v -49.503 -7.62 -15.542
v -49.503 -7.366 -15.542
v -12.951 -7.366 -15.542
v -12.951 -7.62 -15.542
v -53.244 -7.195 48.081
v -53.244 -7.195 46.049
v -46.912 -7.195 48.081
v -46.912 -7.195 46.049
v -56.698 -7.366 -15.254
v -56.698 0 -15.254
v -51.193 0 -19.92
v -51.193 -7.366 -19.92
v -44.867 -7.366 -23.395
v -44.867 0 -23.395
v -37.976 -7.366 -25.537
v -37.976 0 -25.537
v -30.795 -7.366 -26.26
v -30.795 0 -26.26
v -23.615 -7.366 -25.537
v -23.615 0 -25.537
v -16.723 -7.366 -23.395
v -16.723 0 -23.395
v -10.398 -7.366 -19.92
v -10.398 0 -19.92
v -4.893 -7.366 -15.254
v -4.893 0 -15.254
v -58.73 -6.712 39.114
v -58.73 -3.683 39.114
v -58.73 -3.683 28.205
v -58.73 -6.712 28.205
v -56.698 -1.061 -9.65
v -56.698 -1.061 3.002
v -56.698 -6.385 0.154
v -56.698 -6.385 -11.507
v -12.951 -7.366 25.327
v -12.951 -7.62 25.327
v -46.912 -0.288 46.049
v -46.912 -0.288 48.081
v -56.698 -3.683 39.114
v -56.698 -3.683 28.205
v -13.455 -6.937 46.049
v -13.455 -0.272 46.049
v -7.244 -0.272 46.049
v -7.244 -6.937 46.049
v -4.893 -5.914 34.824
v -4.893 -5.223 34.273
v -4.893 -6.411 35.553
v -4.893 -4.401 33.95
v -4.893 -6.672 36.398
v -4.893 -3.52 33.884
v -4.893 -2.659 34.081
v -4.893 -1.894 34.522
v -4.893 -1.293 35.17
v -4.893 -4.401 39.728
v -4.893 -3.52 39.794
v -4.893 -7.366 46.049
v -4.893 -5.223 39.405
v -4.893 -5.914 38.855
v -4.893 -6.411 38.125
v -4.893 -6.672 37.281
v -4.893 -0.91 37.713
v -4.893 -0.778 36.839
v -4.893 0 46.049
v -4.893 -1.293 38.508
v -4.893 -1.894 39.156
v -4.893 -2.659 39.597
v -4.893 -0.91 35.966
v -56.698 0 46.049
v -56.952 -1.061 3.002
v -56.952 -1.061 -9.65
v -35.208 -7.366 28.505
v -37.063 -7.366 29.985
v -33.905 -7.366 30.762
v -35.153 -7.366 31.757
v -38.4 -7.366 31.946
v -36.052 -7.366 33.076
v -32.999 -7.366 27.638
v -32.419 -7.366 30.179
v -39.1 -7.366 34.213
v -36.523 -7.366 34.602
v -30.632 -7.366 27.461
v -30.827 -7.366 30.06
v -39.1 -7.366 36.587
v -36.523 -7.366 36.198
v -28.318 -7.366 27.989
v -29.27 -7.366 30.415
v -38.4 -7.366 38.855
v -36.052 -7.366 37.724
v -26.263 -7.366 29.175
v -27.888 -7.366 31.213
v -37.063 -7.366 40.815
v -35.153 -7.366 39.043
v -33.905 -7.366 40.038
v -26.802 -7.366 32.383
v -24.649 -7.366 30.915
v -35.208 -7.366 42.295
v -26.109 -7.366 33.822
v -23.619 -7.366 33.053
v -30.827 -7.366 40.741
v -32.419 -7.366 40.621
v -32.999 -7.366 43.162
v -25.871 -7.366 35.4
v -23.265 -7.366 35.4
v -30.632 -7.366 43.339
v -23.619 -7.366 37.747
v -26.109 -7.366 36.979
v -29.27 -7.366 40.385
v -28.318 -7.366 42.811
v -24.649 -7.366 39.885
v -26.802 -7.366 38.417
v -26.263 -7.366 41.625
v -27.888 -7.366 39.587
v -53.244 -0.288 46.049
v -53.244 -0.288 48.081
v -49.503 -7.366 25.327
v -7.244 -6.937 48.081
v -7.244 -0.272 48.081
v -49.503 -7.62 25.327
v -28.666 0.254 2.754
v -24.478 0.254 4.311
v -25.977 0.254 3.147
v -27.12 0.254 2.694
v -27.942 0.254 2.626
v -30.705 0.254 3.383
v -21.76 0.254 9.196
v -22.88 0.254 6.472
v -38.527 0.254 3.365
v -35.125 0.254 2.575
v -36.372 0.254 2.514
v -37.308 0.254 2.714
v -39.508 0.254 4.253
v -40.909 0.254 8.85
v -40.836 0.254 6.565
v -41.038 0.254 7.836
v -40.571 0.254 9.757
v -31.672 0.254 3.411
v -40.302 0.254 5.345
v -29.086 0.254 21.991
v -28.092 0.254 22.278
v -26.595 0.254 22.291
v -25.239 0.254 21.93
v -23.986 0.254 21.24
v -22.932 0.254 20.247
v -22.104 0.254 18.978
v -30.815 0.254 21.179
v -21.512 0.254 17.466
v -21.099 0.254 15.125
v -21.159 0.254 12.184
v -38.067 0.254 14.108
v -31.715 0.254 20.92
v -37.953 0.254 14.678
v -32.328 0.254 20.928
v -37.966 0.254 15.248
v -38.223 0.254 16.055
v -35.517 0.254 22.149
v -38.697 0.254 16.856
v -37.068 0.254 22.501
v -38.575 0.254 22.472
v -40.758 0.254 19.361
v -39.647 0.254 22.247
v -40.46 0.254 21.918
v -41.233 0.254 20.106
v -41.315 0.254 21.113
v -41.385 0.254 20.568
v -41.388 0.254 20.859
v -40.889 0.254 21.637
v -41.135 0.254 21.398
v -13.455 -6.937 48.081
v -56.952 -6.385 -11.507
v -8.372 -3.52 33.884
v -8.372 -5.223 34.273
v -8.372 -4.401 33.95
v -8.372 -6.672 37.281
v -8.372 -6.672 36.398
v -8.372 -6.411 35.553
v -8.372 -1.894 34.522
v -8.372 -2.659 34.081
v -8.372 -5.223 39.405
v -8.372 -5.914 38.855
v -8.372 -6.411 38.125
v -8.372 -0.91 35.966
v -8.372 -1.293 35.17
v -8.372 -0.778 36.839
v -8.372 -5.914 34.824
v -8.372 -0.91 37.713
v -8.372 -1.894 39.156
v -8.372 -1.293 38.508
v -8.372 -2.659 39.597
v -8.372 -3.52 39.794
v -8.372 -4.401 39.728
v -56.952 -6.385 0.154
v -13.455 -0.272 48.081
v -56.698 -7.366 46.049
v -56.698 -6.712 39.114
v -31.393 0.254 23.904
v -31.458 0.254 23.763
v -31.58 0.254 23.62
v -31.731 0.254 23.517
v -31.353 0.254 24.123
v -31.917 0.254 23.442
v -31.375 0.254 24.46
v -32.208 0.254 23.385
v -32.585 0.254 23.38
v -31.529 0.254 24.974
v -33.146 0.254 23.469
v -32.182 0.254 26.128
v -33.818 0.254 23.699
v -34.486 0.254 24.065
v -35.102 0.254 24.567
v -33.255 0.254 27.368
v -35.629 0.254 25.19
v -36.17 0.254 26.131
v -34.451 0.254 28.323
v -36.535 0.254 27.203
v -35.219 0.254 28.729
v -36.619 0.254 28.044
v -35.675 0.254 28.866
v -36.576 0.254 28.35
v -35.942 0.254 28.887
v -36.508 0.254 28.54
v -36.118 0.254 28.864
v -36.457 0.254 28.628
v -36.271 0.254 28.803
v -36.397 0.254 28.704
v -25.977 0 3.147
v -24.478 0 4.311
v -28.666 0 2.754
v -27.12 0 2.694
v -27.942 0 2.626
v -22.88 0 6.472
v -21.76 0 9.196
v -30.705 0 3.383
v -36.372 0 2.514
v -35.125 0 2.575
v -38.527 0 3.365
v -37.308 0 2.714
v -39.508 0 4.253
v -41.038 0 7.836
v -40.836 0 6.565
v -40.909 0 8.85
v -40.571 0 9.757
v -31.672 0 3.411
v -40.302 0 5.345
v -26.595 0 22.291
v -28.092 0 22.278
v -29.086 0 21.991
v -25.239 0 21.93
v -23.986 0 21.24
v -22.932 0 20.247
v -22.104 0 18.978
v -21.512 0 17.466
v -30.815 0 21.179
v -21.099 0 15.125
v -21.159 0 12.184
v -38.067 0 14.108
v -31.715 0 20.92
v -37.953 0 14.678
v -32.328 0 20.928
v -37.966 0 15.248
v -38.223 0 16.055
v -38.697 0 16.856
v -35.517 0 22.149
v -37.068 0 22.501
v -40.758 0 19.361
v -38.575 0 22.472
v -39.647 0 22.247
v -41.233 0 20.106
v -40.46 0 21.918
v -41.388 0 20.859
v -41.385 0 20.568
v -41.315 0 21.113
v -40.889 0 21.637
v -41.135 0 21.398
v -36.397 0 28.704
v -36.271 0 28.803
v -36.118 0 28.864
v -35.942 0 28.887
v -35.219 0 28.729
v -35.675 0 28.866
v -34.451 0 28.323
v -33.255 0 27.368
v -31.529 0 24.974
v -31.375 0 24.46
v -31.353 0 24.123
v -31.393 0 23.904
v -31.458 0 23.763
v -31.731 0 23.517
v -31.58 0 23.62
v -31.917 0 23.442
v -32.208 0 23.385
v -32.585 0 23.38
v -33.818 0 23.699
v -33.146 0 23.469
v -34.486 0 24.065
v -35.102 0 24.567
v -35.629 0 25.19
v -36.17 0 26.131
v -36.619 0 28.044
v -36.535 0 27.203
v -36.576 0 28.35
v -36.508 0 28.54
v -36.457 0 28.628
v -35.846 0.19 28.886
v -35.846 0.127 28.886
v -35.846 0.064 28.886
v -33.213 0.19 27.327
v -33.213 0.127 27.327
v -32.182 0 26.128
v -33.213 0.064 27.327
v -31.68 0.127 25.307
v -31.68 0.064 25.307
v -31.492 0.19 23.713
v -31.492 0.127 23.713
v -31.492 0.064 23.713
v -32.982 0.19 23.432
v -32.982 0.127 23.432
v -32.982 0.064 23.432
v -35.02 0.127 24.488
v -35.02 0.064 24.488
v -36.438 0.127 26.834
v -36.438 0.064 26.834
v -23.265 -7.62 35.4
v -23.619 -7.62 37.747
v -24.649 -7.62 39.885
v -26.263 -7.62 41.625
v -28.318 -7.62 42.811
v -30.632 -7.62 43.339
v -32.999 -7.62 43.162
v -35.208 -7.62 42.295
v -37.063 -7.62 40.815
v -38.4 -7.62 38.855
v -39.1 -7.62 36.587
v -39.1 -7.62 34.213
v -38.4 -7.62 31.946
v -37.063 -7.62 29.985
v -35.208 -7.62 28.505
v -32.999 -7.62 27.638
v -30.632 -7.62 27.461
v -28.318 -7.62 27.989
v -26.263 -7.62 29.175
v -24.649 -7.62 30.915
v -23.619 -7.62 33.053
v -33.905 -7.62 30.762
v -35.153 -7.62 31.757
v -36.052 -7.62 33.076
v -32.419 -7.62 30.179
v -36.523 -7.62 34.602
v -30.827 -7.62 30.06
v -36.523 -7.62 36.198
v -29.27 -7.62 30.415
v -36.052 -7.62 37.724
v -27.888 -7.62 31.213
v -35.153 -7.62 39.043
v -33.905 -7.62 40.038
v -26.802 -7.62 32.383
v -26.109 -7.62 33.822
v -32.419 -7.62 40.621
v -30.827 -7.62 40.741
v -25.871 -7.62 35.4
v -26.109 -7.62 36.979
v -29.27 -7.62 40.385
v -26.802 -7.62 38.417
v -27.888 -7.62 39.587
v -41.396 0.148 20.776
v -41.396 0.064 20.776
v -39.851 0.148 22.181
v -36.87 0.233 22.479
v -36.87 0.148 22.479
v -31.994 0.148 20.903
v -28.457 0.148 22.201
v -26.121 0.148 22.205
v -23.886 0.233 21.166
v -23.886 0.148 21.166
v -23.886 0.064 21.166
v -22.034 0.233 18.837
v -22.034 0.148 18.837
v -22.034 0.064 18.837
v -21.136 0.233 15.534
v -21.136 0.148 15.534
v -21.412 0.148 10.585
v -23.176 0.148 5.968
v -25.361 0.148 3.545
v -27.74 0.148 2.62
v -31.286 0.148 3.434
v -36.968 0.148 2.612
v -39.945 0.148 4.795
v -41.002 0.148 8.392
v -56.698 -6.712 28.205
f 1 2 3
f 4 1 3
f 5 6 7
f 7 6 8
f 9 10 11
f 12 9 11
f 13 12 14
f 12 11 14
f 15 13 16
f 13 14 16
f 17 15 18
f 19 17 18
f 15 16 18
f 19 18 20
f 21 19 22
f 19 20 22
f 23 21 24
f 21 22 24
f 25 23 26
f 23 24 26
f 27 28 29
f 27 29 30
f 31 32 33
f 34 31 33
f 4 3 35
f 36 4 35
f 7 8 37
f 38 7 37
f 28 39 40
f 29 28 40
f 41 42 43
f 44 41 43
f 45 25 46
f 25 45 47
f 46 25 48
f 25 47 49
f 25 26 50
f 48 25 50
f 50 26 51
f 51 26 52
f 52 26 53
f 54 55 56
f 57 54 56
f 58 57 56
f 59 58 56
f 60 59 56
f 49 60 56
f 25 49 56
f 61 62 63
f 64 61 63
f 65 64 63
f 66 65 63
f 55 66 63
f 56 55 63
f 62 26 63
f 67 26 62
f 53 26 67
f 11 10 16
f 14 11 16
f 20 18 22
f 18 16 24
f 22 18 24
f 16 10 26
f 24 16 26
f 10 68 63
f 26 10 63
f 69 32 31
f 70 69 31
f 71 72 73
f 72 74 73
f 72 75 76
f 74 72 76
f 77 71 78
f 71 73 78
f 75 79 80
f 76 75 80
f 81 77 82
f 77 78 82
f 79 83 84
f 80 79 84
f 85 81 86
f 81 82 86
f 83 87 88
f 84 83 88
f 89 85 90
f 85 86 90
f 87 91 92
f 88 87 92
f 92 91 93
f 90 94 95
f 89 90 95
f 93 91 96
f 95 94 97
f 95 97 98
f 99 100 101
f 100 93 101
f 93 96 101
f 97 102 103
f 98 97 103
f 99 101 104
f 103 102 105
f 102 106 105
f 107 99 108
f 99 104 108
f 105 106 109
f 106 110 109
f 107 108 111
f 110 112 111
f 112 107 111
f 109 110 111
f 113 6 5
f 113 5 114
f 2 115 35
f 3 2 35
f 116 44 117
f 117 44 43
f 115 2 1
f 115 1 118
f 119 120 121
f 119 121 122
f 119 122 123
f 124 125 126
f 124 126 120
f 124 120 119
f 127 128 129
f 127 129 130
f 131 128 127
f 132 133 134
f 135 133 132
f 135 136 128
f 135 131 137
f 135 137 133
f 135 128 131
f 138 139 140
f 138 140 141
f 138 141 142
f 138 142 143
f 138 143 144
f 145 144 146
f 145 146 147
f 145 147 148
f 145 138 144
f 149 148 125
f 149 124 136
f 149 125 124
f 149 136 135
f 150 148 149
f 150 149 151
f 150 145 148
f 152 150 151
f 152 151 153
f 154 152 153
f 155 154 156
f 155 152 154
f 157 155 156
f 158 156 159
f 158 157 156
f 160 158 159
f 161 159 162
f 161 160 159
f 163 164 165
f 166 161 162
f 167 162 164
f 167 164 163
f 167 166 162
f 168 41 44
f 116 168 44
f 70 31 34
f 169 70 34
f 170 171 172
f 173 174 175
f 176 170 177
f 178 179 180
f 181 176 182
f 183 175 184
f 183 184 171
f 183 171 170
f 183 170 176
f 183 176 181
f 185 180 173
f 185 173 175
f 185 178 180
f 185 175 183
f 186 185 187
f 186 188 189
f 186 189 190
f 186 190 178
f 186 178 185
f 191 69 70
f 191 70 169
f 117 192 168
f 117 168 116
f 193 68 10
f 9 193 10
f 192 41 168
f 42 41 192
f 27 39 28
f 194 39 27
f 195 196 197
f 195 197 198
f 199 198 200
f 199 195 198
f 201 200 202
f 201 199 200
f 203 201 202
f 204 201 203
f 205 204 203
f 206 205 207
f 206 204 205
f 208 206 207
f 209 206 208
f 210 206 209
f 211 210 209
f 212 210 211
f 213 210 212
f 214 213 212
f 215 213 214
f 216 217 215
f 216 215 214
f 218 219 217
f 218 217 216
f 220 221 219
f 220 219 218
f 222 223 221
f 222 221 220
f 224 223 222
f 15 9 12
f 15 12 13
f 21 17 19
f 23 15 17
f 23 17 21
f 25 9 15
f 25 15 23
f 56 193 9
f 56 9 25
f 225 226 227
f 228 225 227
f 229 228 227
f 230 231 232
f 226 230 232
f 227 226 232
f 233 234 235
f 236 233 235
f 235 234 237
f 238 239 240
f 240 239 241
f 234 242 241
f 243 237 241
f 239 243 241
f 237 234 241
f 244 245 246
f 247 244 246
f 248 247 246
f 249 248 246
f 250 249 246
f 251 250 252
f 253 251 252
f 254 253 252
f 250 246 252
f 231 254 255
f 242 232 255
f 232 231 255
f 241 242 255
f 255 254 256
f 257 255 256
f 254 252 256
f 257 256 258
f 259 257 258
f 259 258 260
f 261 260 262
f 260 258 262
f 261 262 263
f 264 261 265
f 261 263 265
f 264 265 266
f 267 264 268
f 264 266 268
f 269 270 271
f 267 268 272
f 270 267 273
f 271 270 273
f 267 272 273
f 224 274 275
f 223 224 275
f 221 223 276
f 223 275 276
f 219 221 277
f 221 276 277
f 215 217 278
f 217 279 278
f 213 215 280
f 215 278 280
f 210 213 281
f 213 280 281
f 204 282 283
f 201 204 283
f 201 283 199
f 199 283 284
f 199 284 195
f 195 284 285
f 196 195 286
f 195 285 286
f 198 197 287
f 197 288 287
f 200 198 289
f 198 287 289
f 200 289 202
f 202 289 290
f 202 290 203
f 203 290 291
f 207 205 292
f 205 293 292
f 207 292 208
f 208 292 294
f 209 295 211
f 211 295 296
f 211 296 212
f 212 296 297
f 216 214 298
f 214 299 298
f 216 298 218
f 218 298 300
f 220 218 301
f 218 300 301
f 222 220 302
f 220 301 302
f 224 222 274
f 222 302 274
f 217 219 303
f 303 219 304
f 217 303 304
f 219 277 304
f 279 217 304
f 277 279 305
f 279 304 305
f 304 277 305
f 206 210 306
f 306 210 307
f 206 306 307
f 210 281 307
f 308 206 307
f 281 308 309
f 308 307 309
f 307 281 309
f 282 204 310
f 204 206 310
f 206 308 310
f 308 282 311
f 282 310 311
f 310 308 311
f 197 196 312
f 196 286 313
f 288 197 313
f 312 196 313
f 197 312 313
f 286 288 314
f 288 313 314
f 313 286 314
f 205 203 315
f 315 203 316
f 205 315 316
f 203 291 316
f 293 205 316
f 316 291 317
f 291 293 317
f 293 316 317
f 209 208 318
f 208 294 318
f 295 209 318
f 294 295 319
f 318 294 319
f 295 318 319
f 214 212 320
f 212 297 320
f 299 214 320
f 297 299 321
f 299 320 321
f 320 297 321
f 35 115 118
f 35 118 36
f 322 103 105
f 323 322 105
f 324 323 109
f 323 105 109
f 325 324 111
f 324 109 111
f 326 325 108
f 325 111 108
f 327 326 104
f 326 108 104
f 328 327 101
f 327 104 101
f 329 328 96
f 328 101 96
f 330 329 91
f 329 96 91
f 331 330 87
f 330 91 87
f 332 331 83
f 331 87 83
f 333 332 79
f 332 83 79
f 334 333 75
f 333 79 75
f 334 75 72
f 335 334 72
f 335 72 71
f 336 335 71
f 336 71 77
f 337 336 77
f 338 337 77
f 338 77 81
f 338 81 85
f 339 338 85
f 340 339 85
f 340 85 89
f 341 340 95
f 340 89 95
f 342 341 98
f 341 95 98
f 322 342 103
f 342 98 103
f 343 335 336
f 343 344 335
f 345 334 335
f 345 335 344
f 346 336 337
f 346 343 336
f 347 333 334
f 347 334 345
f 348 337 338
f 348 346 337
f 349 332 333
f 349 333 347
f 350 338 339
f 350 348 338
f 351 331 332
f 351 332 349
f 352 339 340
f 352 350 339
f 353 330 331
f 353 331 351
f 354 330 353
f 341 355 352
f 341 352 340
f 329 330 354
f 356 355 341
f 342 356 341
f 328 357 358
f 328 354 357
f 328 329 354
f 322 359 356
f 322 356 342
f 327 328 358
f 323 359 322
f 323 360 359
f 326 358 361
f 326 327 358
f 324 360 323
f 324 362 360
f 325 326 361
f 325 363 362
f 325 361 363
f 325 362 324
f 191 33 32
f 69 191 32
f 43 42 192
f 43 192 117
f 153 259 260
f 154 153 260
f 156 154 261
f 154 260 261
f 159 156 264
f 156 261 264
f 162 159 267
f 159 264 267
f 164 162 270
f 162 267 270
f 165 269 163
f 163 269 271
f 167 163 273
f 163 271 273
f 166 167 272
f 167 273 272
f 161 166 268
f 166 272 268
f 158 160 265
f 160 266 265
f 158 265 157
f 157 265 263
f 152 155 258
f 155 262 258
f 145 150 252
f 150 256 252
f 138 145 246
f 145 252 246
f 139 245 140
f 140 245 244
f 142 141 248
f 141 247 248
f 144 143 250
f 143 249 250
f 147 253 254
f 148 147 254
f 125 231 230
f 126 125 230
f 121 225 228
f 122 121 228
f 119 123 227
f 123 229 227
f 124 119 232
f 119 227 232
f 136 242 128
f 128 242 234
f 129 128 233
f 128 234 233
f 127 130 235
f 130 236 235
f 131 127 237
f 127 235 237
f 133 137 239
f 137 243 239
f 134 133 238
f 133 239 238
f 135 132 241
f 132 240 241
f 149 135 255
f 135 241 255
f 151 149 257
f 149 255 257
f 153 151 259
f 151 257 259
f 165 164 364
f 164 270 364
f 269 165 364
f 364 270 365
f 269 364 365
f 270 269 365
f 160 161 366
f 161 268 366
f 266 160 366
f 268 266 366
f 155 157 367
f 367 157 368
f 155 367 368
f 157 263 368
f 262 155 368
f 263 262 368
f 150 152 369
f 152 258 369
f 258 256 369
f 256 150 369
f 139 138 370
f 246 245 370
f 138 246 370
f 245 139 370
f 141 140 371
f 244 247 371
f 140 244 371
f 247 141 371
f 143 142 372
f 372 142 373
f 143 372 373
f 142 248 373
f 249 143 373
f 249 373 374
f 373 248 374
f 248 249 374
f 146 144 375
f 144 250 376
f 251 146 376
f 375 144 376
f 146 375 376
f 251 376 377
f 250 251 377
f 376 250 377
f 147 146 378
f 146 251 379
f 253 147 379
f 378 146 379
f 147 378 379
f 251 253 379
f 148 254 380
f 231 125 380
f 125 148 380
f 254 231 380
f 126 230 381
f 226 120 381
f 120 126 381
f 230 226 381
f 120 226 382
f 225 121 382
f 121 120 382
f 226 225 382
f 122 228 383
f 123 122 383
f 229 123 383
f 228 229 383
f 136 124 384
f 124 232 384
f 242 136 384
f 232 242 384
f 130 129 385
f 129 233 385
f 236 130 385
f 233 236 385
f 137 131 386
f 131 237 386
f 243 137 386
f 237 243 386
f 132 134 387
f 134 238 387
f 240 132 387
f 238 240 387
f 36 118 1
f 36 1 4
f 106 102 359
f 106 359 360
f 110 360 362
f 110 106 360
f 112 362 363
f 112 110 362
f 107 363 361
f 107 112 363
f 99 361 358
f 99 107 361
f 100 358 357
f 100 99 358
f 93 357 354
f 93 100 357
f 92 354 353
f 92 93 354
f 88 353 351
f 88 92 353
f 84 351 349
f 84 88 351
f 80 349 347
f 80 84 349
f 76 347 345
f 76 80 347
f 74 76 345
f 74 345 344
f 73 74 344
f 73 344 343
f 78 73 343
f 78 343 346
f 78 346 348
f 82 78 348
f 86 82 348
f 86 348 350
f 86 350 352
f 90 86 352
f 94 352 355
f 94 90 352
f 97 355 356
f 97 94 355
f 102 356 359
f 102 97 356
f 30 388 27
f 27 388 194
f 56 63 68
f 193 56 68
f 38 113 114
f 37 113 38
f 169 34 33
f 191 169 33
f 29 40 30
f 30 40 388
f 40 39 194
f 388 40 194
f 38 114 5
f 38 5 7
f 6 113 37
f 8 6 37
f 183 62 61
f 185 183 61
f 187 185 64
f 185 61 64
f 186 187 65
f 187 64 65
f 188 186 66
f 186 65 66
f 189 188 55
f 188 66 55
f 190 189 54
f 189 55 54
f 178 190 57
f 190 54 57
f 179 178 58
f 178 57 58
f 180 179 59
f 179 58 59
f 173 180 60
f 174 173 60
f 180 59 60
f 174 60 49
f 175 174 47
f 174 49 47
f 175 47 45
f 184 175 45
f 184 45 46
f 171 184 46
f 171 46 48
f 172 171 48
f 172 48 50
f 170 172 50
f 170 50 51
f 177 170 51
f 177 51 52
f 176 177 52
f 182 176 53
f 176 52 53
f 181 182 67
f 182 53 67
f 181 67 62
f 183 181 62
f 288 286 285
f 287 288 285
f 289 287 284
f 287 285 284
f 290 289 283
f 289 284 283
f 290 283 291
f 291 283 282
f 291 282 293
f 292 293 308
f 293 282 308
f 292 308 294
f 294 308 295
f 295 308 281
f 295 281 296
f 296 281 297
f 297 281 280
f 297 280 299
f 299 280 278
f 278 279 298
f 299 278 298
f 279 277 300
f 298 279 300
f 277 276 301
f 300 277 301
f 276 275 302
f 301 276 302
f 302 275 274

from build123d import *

# Parameters (mm, degrees)
F1_DEPTH  = 7.366
F2_W      = 36.5513302386
F2_H      = 40.8684201539
F3_DEPTH  = 0.254
F2_R      = 7.9616167592
F2_R_2    = 5.3554300859
F4_W      = 3.0288121673
F4_H      = 5.454486236
F5_DEPTH  = 2.032
F7_DEPTH  = 0.254
F8_W      = 6.3317231834
F8_H      = 6.9073382765
F9_DEPTH  = 2.032
F8_W_2    = 6.2107169069
F8_H_2    = 6.6653245594
F10_R     = 2.9631404217
F11_DEPTH = 3.4798
F13_DEPTH = 0.254


with BuildPart() as f1:
    # F0 (on Front) → F1 (new body)
    with BuildSketch(Plane.XZ):
        with BuildLine():
            Line((-4.8926975578, 46.0489243269), (-56.6977337003, 46.0489243269))
            Line((-56.6977337003, 46.0489243269), (-56.6977337003, -15.2537049726))
            ThreePointArc((-56.6977337003, -15.2537049726), (-30.795215629, -26.260280288), (-4.8926975578, -15.2537049726))
            Line((-4.8926975578, -15.2537049726), (-4.8926975578, 46.0489243269))
        make_face()
    extrude(amount=F1_DEPTH)

    # F10 (on face) → F11 (cut)
    with BuildSketch(Plane.YZ.offset(-4.8926975578)):
        with Locations((-3.741475055, 36.8391387165)):
            Circle(F10_R)
    extrude(amount=-F11_DEPTH, mode=Mode.SUBTRACT)


with BuildPart() as f3:
    # F2 (on face) → F3 (new body)
    with BuildSketch(Plane.XZ.offset(7.366)):
        with Locations((-31.2269236892, 4.8926975578)):
            Rectangle(F2_W, F2_H)
    extrude(amount=F3_DEPTH)


with BuildPart() as f3b:
    # F2 (on face) → F3, piece 2 (new body)
    with BuildSketch(Plane.XZ.offset(7.366)):
        with Locations((-31.2269236892, 35.4001075029)):
            Circle(F2_R)
        with Locations((-31.2269236892, 35.4001075029)):
            Circle(F2_R_2, mode=Mode.SUBTRACT)
    extrude(amount=F3_DEPTH)


with BuildPart() as f5:
    # F4 (on face) → F5 (new body)
    with BuildSketch(Plane(origin=(-56.6977337003, 0, 0), x_dir=(0, -1, 0), z_dir=(-1, 0, 0))):
        with Locations((5.1974060837, 36.386703141)):
            Rectangle(F4_W, F4_H)
        with Locations((5.1974060837, 30.9322169051)):
            Rectangle(F4_W, F4_H)
    extrude(amount=F5_DEPTH)


with BuildPart() as f7:
    # F6 (on face) → F7 (new body)
    with BuildSketch(Plane(origin=(-56.6977337003, 0, 0), x_dir=(0, -1, 0), z_dir=(-1, 0, 0))):
        Polygon((6.3851624727, 0.154071301), (1.0607517324, 3.0020113448), (1.0607517324, -9.6497004224), (6.3851624727, -11.5070533696), align=None)
    extrude(amount=F7_DEPTH)


with BuildPart() as f9:
    # F8 (on face) → F9 (new body)
    with BuildSketch(Plane.XY.offset(46.0489243269)):
        with Locations((-50.0782001764, -3.7414757535)):
            Rectangle(F8_W, F8_H)
    extrude(amount=F9_DEPTH)


with BuildPart() as f9b:
    # F8 (on face) → F9, piece 2 (new body)
    with BuildSketch(Plane.XY.offset(46.0489243269)):
        with Locations((-10.3494704235, -3.6046080058)):
            Rectangle(F8_W_2, F8_H_2)
    extrude(amount=F9_DEPTH)


with BuildPart() as f13:
    # F12 (on face) → F13 (new body)
    with BuildSketch(Plane(origin=(0, 0, 0), x_dir=(-1, 0, 0), z_dir=(0, 1, 0))):
        with BuildLine():
            add(Edge.make_bspline(
                [(37.9658814311, 15.2476904657), (38.2691568797, 17.2861614502), (44.2235218983, 21.1442410272), (36.2827291762, 23.4912048852), (32.0720889453, 19.7789623292), (28.5845616604, 22.9367994762), (23.1629401078, 21.7159921366), (20.2248007204, 15.5174000757), (22.0736262178, 5.694463869), (27.6646008004, 1.5743841481), (31.285875674, 4.4786447817), (37.2381136551, 0.651620368), (43.5687909465, 8.8249085535), (37.6403086509, 13.0593475952), (37.9658814311, 15.2476904657)],
                knots=[0, 0, 0, 0, 0.0884834432, 0.1647690899, 0.2433018614, 0.3106427185, 0.3857442711, 0.4725916215, 0.5810815103, 0.6636182265, 0.7297867694, 0.812908301, 0.9050111022, 1, 1, 1, 1], degree=3))
        make_face()
    extrude(amount=F13_DEPTH)


with BuildPart() as f13b:
    # F12 (on face) → F13, piece 2 (new body)
    with BuildSketch(Plane(origin=(0, 0, 0), x_dir=(-1, 0, 0), z_dir=(0, 1, 0))):
        with BuildLine():
            add(Edge.make_bspline(
                [(36.397062242, 28.7041198462), (35.8733517965, 29.259220262), (32.8254484734, 27.6573757529), (30.0676811551, 22.7811330289), (35.8153821145, 23.6533178277), (36.9892720908, 28.0764143344), (36.397062242, 28.7041198462)],
                knots=[0, 0, 0, 0, 0.2366597446, 0.4908887348, 0.7323860298, 1, 1, 1, 1], degree=3))
        make_face()
    extrude(amount=F13_DEPTH)


solid = Compound([f1.part, f3.part, f3b.part, f5.part, f7.part, f9.part, f9b.part, f13.part, f13b.part])
